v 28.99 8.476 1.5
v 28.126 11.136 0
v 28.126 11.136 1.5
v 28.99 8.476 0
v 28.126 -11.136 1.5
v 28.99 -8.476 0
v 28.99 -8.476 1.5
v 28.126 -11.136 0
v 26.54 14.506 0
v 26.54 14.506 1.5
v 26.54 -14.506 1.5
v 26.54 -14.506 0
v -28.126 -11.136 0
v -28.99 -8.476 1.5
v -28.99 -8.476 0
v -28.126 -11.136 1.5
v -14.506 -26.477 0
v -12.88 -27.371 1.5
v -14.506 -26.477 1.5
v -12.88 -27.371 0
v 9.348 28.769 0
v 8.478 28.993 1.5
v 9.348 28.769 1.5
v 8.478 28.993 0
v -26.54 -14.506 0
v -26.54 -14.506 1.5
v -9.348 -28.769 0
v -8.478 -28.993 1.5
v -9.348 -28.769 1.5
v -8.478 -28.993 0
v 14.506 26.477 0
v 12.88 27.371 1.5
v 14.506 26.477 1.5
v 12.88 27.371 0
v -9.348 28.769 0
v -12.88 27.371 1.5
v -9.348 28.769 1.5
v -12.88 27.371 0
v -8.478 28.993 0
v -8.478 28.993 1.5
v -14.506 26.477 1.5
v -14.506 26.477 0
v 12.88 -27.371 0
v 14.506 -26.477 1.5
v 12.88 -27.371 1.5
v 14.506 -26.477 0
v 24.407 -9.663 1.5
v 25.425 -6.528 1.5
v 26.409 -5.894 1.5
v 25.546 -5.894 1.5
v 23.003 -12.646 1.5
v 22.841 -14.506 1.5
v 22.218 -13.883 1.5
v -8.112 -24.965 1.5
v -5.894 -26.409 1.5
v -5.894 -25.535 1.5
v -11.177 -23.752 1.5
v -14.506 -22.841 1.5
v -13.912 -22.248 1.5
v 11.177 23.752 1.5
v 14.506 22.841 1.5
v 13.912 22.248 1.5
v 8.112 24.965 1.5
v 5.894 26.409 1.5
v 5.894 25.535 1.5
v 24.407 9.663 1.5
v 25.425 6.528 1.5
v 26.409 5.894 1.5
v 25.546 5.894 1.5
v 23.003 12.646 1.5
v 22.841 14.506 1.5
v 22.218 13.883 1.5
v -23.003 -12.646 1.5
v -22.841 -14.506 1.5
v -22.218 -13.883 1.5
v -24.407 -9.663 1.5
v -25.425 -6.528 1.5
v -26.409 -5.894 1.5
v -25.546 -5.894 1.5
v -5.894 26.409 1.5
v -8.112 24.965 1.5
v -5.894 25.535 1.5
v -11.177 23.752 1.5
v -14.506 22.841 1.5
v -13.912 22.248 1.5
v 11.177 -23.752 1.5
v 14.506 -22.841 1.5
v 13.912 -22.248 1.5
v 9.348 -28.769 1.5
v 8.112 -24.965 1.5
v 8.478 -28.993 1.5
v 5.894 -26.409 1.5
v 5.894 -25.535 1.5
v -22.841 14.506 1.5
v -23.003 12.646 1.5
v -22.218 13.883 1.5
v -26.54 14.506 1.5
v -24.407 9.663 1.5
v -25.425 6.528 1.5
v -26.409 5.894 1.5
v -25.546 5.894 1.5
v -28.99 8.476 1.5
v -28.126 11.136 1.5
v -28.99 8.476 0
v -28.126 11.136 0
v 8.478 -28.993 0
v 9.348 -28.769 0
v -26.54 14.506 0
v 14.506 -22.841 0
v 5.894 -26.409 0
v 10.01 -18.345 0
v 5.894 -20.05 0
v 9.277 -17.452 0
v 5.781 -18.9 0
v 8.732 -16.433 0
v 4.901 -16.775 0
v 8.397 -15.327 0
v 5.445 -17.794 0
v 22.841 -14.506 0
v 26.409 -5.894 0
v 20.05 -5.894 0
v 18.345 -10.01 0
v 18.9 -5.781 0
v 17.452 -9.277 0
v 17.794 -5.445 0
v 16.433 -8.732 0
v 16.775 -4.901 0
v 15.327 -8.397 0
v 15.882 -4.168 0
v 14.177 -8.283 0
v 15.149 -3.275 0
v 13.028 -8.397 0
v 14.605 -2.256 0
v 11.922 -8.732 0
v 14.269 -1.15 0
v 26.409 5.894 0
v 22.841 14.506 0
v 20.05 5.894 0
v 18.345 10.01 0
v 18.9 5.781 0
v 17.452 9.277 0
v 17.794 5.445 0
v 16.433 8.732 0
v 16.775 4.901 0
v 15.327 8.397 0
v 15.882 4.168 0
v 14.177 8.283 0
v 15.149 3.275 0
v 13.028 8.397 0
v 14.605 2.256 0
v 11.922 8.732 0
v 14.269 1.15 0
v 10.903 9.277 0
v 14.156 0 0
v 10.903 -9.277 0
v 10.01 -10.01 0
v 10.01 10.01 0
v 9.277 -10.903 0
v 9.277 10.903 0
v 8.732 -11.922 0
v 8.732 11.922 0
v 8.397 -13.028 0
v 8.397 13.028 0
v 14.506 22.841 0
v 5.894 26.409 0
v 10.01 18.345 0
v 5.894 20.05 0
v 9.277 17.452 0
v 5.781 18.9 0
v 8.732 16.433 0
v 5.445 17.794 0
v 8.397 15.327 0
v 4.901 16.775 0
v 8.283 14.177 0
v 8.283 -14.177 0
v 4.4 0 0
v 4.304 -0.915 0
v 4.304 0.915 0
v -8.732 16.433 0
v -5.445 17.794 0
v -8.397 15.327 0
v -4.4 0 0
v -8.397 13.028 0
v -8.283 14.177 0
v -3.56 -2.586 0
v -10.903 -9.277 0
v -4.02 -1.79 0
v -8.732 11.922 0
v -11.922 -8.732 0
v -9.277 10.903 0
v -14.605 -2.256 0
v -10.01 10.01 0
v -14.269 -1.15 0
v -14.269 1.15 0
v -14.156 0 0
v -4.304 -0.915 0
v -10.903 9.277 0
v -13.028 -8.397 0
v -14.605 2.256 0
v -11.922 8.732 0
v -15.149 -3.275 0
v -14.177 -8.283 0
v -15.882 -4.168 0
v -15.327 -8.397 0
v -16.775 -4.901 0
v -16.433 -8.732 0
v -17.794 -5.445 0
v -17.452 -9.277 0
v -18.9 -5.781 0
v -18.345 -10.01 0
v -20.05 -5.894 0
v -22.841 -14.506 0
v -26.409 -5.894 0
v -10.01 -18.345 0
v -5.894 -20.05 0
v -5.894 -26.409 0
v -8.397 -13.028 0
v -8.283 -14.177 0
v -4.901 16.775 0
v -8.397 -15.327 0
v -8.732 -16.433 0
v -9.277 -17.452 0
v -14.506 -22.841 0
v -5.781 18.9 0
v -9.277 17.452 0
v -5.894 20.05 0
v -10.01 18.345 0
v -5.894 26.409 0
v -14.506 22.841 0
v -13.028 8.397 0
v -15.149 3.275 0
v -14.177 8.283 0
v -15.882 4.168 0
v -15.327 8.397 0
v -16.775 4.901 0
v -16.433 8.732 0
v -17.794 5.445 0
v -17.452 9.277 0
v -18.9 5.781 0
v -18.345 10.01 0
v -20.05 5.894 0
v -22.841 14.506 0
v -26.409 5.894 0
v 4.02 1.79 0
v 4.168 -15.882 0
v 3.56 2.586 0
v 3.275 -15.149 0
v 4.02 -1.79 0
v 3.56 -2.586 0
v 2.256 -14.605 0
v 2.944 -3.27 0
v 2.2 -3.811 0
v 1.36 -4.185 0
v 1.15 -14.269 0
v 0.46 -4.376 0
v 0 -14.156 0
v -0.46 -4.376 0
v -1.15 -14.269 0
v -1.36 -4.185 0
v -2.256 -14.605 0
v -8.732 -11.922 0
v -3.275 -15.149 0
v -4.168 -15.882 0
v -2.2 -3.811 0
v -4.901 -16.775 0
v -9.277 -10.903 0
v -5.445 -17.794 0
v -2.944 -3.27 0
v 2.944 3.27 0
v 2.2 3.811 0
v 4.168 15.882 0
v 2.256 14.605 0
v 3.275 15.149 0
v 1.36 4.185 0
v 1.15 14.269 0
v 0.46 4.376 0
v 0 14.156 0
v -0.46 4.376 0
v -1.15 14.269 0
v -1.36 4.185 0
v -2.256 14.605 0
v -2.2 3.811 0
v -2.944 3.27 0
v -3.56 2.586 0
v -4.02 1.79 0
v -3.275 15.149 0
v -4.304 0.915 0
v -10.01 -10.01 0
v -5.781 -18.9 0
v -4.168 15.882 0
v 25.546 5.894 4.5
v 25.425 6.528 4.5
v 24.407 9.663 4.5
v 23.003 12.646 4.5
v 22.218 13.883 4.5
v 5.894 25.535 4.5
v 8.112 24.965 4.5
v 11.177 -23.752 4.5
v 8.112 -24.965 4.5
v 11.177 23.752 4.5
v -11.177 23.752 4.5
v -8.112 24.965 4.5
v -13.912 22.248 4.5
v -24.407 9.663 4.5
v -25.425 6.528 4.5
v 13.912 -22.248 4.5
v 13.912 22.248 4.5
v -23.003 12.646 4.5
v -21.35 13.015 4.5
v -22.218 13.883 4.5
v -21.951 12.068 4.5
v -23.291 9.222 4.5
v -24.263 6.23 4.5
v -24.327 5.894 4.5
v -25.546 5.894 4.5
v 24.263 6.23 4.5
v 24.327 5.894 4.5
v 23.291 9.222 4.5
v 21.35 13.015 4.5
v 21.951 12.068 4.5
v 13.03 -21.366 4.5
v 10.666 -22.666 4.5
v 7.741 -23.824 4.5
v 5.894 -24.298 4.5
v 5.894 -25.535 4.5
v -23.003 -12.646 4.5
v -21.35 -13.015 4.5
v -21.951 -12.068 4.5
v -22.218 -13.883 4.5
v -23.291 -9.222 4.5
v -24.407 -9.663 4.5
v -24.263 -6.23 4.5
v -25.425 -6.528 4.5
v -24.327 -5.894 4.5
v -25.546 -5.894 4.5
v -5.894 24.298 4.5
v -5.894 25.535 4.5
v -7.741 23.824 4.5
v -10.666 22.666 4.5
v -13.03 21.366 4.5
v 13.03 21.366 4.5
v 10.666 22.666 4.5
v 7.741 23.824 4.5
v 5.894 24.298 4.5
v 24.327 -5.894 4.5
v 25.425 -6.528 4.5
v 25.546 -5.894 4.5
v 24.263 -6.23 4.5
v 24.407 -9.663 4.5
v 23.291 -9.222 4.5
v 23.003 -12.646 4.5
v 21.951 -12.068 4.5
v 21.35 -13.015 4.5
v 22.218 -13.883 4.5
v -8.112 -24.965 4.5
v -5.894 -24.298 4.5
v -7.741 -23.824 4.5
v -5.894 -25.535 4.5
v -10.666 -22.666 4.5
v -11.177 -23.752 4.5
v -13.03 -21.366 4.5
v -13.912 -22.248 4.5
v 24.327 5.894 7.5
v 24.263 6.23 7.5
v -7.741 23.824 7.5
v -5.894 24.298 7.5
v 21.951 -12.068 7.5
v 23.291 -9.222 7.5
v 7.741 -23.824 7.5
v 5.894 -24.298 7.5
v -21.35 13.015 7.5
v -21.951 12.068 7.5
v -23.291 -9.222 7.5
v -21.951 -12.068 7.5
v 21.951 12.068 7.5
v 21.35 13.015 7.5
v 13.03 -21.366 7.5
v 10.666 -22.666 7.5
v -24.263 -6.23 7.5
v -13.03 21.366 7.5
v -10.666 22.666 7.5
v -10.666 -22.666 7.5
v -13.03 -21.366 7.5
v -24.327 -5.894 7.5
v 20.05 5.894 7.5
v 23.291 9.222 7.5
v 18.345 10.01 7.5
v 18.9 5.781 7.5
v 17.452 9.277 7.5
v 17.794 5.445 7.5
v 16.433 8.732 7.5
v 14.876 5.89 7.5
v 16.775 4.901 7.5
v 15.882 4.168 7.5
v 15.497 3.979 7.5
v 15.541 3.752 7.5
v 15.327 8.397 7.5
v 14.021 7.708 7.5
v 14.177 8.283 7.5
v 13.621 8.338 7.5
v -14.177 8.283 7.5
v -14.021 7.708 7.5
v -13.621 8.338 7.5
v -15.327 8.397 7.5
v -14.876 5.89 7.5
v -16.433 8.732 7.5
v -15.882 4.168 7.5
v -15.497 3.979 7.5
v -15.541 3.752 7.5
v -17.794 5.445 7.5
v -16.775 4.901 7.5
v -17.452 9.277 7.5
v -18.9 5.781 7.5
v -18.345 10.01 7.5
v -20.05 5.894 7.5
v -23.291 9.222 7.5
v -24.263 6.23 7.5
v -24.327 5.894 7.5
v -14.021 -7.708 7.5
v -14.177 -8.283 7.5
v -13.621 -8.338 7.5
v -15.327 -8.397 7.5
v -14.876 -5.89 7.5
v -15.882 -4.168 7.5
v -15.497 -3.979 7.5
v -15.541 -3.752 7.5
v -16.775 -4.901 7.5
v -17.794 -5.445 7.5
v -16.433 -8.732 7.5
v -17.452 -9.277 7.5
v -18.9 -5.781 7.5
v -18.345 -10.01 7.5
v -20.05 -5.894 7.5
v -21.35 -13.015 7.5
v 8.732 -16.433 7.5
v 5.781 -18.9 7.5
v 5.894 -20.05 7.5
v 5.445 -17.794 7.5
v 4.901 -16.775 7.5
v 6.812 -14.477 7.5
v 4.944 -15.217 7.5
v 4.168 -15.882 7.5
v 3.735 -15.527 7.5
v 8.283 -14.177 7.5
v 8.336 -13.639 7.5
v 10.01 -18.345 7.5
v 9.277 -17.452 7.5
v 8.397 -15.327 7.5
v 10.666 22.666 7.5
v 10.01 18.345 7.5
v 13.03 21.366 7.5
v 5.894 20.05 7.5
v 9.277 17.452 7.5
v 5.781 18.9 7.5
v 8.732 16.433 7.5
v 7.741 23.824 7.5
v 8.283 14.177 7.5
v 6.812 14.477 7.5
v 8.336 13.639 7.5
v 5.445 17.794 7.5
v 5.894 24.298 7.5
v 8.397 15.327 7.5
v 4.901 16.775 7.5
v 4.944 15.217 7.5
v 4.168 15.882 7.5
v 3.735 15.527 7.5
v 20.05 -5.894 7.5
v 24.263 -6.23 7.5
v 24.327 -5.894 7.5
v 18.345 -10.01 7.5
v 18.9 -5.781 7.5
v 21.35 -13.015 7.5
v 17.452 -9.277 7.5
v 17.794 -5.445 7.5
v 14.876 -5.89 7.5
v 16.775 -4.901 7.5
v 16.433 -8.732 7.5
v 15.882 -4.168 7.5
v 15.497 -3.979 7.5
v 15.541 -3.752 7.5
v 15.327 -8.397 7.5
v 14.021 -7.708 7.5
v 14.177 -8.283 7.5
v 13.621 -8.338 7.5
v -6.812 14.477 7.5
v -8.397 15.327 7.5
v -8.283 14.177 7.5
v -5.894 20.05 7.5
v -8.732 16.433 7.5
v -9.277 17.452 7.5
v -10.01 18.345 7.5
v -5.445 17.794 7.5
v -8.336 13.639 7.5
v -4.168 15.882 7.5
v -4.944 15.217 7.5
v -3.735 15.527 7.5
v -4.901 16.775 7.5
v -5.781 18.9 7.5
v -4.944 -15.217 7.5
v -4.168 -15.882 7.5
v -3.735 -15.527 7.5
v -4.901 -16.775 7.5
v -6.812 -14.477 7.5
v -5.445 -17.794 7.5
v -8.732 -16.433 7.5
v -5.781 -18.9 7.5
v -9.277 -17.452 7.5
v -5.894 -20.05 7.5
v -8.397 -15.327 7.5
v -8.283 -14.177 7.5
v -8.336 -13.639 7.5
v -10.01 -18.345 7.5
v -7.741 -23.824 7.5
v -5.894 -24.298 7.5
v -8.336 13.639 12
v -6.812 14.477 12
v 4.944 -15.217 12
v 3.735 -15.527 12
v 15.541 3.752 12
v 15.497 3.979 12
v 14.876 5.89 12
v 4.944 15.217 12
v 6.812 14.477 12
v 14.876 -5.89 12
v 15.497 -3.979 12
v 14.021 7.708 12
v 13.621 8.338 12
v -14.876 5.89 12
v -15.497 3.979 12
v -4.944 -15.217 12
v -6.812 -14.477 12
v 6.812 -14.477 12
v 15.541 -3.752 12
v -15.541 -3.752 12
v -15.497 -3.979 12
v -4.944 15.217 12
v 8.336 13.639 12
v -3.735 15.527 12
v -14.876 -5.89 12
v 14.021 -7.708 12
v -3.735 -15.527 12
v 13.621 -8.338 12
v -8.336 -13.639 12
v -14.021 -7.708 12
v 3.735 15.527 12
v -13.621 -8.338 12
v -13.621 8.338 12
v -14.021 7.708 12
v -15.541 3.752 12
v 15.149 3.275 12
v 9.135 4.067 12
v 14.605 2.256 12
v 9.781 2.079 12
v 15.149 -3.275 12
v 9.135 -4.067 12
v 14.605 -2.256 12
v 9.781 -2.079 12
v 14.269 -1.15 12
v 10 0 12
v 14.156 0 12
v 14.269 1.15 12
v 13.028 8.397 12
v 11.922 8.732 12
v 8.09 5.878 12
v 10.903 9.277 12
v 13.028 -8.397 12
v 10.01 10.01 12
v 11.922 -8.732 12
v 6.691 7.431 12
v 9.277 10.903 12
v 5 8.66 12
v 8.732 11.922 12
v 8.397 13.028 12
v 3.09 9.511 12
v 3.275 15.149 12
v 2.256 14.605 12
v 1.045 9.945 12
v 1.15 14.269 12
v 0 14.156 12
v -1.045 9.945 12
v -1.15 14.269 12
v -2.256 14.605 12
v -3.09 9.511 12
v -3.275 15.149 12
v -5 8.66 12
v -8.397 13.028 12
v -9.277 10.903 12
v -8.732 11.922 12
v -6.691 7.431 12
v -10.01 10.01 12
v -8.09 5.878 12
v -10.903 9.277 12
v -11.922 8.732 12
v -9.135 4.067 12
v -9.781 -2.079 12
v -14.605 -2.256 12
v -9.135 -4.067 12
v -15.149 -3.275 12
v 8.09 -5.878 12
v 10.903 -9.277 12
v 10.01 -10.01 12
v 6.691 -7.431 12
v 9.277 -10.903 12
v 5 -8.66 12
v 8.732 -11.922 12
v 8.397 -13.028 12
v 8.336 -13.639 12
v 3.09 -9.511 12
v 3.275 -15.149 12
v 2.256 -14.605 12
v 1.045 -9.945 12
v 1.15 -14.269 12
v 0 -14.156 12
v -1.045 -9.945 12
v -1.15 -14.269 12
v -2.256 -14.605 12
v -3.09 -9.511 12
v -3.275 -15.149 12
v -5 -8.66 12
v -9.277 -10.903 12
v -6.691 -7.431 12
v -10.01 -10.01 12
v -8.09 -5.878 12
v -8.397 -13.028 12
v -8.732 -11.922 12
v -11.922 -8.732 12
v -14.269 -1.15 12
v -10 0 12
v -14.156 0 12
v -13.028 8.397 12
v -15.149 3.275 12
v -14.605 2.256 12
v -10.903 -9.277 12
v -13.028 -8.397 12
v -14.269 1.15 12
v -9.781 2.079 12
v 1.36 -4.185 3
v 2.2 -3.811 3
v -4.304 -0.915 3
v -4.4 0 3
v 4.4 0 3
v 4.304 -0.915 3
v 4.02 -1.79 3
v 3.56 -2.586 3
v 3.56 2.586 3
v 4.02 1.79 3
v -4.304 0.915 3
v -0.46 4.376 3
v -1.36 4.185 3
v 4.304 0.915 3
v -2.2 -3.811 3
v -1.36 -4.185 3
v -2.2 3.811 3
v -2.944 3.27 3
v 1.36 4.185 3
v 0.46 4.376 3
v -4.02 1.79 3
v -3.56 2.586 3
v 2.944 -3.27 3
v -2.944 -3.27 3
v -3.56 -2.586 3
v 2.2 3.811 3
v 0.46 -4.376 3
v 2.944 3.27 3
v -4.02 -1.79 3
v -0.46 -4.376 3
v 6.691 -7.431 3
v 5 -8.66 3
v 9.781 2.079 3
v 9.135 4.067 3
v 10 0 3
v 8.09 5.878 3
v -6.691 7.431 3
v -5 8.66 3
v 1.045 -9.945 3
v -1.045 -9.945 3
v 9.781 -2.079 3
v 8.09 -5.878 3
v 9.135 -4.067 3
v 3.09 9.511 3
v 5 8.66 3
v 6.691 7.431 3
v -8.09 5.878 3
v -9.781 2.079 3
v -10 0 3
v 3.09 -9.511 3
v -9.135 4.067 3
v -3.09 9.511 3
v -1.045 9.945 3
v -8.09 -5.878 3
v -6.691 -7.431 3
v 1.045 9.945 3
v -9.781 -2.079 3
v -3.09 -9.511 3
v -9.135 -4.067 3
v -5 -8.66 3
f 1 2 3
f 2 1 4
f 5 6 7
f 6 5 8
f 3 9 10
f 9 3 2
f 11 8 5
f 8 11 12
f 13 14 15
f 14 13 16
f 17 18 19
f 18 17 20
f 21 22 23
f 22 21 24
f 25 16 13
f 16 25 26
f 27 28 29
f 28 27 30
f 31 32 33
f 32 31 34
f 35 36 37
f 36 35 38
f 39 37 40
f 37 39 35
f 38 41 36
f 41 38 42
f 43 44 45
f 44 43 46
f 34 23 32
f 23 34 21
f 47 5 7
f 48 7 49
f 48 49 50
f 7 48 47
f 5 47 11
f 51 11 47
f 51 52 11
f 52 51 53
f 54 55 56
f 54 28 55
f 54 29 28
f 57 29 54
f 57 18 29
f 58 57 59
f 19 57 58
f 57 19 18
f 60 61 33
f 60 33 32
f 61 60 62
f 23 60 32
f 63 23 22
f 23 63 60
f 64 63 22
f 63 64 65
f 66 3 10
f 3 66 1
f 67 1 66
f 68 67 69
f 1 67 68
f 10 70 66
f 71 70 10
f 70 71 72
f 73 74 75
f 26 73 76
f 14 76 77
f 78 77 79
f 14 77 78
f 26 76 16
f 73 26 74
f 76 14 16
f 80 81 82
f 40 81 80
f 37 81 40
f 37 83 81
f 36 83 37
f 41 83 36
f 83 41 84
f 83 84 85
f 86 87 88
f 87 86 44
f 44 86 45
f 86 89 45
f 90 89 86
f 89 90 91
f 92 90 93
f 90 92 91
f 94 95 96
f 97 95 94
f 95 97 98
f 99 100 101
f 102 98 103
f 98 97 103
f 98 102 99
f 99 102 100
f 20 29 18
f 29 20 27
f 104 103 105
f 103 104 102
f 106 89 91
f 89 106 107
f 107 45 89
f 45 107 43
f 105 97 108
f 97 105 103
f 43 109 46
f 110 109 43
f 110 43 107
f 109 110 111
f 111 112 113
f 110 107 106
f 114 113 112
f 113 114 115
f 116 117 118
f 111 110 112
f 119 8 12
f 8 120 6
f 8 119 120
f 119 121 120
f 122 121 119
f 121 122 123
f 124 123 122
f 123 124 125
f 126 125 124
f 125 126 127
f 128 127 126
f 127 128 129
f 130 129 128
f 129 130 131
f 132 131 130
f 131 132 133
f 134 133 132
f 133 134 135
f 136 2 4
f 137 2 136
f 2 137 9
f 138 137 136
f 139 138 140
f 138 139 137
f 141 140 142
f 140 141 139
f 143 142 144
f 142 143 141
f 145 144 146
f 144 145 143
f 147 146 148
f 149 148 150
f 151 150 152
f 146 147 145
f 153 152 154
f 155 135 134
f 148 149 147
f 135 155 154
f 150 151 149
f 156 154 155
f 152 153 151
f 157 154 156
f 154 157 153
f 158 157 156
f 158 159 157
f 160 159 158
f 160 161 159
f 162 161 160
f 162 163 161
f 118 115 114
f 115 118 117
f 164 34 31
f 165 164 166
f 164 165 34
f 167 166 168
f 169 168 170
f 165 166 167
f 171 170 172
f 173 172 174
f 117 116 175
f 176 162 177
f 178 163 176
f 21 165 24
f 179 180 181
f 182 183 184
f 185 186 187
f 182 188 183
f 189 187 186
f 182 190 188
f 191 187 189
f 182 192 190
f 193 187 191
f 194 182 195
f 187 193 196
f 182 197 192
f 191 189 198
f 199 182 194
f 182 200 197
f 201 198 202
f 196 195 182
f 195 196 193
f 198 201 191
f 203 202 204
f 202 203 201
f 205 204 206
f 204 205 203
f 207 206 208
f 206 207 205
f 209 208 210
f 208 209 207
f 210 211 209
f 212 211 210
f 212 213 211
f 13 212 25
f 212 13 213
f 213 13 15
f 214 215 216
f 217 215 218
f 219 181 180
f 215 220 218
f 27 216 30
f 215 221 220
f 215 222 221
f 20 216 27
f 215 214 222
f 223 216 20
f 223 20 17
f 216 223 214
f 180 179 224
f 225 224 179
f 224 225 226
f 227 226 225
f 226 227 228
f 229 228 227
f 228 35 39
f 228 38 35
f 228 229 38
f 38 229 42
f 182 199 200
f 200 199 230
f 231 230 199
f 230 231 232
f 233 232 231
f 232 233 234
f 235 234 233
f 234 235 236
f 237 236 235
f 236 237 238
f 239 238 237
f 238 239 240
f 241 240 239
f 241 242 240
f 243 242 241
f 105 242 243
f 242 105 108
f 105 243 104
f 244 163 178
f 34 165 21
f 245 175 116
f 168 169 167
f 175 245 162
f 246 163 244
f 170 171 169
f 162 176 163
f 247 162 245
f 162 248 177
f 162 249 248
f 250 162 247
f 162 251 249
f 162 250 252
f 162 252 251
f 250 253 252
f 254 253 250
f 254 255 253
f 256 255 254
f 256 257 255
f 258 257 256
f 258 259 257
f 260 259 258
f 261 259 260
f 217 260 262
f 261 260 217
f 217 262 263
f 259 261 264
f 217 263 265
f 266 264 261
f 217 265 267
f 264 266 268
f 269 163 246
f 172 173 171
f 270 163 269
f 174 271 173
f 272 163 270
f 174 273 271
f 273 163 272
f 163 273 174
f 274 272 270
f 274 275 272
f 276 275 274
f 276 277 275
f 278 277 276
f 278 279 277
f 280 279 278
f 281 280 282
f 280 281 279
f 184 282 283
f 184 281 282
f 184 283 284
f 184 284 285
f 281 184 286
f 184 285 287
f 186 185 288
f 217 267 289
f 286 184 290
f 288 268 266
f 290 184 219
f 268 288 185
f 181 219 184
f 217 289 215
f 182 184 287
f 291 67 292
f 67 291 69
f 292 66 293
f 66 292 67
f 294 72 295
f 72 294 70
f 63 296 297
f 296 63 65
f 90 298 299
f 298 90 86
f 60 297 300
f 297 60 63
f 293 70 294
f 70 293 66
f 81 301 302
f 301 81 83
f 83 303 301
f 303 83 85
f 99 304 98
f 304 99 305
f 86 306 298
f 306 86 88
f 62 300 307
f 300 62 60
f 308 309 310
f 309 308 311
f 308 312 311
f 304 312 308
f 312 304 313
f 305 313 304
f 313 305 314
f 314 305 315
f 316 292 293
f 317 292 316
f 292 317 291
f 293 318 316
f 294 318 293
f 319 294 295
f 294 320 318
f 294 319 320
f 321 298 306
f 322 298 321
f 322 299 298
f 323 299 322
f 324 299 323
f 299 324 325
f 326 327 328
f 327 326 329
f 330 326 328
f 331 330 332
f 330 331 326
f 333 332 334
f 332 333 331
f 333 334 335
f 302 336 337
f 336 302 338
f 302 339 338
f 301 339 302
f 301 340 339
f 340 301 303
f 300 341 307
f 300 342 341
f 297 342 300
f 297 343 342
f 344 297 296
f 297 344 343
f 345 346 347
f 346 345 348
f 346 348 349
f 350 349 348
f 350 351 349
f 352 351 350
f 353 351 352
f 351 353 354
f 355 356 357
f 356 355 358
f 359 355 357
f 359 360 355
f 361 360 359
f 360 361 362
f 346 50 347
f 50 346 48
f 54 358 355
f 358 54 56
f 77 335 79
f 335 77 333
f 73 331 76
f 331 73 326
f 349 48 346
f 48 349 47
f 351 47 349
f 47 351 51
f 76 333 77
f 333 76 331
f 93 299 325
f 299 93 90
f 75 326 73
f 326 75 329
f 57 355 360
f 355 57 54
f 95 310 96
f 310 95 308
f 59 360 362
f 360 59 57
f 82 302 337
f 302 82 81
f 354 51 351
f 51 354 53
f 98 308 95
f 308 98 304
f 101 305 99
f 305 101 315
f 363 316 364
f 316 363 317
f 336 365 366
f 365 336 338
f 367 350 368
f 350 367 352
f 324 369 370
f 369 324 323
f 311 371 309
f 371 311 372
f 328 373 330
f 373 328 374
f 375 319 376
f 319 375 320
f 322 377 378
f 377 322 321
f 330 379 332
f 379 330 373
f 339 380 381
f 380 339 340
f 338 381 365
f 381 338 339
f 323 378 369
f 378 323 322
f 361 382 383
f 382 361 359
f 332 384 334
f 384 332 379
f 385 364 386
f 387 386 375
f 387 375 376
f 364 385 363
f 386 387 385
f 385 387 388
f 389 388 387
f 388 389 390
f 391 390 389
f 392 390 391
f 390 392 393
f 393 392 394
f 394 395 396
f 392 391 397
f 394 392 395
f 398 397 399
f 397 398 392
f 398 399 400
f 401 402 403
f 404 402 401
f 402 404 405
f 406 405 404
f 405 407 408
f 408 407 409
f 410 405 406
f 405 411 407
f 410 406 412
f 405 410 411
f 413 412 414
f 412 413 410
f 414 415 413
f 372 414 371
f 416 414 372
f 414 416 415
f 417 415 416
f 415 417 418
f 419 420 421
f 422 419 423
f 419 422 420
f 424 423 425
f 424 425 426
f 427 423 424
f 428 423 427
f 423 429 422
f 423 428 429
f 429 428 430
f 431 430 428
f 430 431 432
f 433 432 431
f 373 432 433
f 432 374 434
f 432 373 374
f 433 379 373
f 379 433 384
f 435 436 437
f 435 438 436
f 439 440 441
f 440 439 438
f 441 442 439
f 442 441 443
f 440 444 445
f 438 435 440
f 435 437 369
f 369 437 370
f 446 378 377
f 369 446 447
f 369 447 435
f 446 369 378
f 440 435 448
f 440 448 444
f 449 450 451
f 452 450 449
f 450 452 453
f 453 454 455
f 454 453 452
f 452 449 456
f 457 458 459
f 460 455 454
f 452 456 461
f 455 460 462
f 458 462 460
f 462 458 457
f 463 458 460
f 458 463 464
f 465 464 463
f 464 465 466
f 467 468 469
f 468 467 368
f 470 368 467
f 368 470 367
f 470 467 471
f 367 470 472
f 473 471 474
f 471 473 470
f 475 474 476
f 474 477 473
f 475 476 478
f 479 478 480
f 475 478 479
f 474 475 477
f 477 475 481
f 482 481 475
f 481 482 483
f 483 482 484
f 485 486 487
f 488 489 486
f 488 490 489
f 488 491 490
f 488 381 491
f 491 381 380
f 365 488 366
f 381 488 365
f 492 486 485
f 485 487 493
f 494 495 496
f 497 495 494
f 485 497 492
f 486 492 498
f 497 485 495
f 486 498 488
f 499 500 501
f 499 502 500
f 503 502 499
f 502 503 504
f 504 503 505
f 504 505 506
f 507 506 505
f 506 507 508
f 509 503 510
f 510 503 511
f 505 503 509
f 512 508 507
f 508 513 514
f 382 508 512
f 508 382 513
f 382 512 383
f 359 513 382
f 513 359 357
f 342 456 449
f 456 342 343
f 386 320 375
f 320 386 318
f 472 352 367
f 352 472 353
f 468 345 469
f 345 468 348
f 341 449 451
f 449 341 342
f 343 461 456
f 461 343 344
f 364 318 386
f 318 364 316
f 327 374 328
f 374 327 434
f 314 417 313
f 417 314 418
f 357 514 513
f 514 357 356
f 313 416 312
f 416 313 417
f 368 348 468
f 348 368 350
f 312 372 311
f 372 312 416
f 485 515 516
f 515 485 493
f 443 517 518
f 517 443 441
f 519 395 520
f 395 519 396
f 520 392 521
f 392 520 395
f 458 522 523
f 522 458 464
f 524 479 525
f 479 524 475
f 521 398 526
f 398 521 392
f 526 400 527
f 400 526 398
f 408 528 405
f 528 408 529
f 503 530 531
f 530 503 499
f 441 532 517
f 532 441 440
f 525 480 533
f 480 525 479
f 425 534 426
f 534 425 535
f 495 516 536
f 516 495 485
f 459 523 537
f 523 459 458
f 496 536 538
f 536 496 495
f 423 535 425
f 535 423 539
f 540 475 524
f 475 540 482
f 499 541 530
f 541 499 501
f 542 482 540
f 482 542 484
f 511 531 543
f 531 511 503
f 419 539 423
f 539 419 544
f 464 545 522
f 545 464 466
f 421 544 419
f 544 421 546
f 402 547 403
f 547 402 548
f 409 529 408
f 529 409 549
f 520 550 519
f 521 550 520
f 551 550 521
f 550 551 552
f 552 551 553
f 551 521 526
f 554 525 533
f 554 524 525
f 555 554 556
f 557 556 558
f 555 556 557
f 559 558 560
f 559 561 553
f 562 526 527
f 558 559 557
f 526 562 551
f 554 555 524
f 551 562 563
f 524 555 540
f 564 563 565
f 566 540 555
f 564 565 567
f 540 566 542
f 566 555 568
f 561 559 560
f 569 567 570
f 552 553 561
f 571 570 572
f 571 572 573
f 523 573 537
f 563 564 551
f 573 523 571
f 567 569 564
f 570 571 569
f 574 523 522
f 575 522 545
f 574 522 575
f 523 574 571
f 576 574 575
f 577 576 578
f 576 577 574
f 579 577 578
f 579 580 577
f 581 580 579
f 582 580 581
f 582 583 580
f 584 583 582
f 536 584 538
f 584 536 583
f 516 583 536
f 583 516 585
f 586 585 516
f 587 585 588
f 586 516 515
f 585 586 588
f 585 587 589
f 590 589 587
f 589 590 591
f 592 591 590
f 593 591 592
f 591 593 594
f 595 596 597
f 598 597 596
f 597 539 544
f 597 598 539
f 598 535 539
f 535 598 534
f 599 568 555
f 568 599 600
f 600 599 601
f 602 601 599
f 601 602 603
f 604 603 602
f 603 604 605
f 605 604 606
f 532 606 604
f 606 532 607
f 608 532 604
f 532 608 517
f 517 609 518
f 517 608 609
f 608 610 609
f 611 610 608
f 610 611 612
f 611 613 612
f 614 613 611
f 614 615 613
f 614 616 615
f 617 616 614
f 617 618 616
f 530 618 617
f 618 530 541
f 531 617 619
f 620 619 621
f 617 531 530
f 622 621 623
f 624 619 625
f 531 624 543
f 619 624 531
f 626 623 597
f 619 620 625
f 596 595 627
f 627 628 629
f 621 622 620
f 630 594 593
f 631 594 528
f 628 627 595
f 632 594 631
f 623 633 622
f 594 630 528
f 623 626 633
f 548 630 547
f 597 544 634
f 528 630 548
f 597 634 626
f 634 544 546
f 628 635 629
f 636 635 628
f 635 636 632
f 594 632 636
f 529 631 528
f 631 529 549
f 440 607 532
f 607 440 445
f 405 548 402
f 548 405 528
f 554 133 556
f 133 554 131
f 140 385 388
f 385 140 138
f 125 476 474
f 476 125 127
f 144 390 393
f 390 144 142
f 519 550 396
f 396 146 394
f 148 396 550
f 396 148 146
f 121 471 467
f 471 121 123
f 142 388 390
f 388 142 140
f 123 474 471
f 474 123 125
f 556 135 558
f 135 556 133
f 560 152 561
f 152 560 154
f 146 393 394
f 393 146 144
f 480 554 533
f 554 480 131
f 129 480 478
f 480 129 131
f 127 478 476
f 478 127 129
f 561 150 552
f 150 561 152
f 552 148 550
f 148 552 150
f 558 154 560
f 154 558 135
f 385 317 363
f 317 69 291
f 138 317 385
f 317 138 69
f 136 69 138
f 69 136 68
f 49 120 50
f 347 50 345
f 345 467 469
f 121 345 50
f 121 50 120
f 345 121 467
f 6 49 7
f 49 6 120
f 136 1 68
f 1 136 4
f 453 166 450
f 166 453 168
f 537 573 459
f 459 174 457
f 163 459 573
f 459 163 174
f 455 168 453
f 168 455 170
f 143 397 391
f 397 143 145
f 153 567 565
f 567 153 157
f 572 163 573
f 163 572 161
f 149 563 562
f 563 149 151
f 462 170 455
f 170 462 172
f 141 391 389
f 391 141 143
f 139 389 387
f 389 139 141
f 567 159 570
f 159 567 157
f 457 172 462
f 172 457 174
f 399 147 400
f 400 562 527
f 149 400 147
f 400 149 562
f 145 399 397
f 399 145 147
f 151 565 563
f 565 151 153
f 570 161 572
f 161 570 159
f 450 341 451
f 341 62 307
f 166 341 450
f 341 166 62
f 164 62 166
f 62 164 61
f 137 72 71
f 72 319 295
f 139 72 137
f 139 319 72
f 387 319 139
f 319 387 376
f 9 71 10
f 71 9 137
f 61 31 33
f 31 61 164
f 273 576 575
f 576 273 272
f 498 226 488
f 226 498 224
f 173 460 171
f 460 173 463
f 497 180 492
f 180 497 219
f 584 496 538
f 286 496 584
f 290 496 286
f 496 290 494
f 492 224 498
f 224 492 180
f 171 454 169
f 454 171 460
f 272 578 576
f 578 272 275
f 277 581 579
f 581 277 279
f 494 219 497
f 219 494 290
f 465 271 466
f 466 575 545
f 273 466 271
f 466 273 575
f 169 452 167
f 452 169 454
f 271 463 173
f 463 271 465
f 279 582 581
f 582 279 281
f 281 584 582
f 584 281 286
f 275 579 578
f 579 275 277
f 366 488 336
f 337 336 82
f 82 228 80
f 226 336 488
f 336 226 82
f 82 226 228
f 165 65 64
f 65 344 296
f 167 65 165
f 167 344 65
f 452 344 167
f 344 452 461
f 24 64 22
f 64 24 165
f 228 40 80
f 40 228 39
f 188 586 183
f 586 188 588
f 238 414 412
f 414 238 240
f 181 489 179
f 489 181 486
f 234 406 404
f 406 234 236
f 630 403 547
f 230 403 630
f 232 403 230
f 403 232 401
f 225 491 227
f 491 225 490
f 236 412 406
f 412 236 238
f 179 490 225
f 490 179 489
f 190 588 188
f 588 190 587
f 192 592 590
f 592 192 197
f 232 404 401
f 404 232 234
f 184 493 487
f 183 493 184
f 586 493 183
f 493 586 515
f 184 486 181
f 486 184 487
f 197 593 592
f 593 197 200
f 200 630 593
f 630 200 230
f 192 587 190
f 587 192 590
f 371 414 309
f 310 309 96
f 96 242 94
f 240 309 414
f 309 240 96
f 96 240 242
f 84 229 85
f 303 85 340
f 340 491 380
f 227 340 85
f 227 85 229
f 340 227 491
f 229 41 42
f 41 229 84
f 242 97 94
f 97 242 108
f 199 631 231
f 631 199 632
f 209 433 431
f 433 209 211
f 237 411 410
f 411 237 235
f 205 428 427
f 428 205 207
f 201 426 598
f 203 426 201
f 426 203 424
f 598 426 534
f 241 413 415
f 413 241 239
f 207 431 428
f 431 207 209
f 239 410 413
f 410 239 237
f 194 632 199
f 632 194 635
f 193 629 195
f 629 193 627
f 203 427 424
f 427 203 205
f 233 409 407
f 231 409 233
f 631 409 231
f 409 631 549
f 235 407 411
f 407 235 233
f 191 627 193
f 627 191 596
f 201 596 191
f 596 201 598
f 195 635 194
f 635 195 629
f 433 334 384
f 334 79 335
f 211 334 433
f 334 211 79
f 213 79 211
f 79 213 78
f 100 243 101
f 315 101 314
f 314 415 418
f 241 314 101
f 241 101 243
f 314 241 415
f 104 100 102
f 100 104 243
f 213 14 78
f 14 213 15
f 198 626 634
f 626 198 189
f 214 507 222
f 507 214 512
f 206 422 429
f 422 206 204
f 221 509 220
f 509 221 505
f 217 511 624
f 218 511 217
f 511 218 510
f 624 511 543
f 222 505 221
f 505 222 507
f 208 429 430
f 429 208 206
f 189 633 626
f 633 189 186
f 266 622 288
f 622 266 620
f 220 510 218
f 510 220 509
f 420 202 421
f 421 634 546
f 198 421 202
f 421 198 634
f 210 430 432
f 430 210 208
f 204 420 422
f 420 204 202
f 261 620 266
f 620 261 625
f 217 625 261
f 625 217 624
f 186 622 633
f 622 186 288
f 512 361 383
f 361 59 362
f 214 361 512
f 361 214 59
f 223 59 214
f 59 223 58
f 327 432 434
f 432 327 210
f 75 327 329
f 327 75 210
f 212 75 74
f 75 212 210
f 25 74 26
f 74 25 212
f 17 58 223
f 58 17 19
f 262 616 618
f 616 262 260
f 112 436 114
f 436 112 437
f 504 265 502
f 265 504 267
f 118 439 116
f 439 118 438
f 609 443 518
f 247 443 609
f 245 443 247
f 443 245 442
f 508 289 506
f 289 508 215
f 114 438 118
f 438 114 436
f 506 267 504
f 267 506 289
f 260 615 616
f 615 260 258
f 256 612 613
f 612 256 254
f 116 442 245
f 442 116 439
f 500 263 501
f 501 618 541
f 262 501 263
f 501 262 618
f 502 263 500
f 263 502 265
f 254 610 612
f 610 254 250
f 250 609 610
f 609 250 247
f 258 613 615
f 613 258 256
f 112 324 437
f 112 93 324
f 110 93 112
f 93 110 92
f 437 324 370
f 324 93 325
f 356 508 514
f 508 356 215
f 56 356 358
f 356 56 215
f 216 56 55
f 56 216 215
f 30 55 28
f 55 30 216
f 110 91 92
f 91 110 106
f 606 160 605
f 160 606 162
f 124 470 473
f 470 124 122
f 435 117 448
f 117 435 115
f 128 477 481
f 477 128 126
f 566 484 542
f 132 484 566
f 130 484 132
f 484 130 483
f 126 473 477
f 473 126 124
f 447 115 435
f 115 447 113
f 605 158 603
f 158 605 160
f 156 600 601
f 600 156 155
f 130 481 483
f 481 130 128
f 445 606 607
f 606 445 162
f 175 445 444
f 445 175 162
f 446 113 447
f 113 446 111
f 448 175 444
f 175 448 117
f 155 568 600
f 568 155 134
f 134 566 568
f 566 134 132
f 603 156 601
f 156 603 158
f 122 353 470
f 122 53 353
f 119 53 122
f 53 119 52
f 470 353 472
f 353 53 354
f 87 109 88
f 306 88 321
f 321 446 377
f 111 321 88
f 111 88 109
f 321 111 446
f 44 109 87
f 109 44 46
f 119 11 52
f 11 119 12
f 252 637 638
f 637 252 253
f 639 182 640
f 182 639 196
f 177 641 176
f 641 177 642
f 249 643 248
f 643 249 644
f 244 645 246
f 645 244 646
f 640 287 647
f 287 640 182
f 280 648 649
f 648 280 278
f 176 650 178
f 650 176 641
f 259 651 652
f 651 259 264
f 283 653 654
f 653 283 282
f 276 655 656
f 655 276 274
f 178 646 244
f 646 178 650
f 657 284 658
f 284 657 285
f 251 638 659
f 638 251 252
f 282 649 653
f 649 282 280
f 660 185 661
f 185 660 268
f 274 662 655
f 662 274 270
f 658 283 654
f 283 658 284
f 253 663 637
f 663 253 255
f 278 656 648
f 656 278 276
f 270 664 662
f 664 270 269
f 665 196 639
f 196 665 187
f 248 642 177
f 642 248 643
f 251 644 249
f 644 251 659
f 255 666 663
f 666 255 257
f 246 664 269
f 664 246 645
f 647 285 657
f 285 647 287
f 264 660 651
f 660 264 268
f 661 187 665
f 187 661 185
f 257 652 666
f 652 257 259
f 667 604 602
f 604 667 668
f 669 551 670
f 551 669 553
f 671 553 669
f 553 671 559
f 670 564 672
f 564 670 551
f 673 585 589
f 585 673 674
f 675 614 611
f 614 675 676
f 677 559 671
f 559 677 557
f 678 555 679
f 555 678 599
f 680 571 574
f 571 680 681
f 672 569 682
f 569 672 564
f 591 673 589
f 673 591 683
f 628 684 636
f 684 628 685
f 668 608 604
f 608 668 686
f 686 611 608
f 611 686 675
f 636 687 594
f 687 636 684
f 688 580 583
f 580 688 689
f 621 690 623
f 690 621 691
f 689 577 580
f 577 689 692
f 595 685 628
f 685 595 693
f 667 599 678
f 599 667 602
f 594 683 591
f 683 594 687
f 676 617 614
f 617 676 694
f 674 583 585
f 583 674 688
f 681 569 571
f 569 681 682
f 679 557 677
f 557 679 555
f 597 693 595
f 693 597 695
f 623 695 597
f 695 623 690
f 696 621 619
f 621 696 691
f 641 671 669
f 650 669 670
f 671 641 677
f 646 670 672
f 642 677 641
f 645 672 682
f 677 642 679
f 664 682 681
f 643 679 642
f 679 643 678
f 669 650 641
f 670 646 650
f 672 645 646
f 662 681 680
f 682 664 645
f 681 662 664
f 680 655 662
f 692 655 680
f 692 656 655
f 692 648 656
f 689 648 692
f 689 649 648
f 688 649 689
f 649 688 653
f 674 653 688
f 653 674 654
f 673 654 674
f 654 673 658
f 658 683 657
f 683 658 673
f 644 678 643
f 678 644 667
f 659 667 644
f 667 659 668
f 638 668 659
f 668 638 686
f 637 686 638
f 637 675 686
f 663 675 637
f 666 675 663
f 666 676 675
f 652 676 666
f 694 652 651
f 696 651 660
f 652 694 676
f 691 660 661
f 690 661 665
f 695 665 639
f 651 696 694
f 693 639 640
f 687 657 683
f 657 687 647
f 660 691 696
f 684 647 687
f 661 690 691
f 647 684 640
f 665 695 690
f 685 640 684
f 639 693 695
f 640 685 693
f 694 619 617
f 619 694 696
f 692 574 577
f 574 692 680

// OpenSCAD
// RebeliX
//
// spool-center
// GNU GPL v3
// Martin Neruda <neruda@reprap4u.cz>
// http://www.reprap4u.cz

// Prumer otvoru v civce
spool_hole_biggest = 52.5; // "Fillamentum"
spool_hole_big = 50.1; // "plasty Mladec"
spool_hole_small = 32; // "MK Floria"

union() {
    difference()
    {
	    union ()
	    {
            cylinder(h=1.5, r=(spool_hole_biggest/2)+4,$fn=50);
		    cylinder(h=4.5,r=(spool_hole_biggest/2),$fn=50);
            cylinder(h=7.5,r=(spool_hole_big/2),$fn=50);
		    cylinder(h=12,r=(spool_hole_small/2),$fn=50);
	    }
	    translate([0,0,-0.1]) cylinder (h=13,r=4.4,$fn=30);
		for ( i = [0 : 45 : 360] ){
		  rotate([0,0,i]) {
			translate([spool_hole_big/2 - 5,0,0]) cylinder(r=spool_hole_big/8.5,h=30, $fn=32,center=true);
			translate([spool_hole_big/2 + spool_hole_big/8.5 - 5,0,0]) cube([2*(spool_hole_big/8.5),2*(spool_hole_big/8.5),20],center=true);
			translate([spool_hole_big/2 + 4,- 5,0]) rotate([0,0,45]) cube([5,5,5],center=true);
			translate([spool_hole_big/2 + 4,+ 5,0]) rotate([0,0,45]) cube([5,5,5],center=true);
		  }
		}		
		translate([0,0,3]) cylinder(h=10,r=(spool_hole_small-12)/2);
    }
}
